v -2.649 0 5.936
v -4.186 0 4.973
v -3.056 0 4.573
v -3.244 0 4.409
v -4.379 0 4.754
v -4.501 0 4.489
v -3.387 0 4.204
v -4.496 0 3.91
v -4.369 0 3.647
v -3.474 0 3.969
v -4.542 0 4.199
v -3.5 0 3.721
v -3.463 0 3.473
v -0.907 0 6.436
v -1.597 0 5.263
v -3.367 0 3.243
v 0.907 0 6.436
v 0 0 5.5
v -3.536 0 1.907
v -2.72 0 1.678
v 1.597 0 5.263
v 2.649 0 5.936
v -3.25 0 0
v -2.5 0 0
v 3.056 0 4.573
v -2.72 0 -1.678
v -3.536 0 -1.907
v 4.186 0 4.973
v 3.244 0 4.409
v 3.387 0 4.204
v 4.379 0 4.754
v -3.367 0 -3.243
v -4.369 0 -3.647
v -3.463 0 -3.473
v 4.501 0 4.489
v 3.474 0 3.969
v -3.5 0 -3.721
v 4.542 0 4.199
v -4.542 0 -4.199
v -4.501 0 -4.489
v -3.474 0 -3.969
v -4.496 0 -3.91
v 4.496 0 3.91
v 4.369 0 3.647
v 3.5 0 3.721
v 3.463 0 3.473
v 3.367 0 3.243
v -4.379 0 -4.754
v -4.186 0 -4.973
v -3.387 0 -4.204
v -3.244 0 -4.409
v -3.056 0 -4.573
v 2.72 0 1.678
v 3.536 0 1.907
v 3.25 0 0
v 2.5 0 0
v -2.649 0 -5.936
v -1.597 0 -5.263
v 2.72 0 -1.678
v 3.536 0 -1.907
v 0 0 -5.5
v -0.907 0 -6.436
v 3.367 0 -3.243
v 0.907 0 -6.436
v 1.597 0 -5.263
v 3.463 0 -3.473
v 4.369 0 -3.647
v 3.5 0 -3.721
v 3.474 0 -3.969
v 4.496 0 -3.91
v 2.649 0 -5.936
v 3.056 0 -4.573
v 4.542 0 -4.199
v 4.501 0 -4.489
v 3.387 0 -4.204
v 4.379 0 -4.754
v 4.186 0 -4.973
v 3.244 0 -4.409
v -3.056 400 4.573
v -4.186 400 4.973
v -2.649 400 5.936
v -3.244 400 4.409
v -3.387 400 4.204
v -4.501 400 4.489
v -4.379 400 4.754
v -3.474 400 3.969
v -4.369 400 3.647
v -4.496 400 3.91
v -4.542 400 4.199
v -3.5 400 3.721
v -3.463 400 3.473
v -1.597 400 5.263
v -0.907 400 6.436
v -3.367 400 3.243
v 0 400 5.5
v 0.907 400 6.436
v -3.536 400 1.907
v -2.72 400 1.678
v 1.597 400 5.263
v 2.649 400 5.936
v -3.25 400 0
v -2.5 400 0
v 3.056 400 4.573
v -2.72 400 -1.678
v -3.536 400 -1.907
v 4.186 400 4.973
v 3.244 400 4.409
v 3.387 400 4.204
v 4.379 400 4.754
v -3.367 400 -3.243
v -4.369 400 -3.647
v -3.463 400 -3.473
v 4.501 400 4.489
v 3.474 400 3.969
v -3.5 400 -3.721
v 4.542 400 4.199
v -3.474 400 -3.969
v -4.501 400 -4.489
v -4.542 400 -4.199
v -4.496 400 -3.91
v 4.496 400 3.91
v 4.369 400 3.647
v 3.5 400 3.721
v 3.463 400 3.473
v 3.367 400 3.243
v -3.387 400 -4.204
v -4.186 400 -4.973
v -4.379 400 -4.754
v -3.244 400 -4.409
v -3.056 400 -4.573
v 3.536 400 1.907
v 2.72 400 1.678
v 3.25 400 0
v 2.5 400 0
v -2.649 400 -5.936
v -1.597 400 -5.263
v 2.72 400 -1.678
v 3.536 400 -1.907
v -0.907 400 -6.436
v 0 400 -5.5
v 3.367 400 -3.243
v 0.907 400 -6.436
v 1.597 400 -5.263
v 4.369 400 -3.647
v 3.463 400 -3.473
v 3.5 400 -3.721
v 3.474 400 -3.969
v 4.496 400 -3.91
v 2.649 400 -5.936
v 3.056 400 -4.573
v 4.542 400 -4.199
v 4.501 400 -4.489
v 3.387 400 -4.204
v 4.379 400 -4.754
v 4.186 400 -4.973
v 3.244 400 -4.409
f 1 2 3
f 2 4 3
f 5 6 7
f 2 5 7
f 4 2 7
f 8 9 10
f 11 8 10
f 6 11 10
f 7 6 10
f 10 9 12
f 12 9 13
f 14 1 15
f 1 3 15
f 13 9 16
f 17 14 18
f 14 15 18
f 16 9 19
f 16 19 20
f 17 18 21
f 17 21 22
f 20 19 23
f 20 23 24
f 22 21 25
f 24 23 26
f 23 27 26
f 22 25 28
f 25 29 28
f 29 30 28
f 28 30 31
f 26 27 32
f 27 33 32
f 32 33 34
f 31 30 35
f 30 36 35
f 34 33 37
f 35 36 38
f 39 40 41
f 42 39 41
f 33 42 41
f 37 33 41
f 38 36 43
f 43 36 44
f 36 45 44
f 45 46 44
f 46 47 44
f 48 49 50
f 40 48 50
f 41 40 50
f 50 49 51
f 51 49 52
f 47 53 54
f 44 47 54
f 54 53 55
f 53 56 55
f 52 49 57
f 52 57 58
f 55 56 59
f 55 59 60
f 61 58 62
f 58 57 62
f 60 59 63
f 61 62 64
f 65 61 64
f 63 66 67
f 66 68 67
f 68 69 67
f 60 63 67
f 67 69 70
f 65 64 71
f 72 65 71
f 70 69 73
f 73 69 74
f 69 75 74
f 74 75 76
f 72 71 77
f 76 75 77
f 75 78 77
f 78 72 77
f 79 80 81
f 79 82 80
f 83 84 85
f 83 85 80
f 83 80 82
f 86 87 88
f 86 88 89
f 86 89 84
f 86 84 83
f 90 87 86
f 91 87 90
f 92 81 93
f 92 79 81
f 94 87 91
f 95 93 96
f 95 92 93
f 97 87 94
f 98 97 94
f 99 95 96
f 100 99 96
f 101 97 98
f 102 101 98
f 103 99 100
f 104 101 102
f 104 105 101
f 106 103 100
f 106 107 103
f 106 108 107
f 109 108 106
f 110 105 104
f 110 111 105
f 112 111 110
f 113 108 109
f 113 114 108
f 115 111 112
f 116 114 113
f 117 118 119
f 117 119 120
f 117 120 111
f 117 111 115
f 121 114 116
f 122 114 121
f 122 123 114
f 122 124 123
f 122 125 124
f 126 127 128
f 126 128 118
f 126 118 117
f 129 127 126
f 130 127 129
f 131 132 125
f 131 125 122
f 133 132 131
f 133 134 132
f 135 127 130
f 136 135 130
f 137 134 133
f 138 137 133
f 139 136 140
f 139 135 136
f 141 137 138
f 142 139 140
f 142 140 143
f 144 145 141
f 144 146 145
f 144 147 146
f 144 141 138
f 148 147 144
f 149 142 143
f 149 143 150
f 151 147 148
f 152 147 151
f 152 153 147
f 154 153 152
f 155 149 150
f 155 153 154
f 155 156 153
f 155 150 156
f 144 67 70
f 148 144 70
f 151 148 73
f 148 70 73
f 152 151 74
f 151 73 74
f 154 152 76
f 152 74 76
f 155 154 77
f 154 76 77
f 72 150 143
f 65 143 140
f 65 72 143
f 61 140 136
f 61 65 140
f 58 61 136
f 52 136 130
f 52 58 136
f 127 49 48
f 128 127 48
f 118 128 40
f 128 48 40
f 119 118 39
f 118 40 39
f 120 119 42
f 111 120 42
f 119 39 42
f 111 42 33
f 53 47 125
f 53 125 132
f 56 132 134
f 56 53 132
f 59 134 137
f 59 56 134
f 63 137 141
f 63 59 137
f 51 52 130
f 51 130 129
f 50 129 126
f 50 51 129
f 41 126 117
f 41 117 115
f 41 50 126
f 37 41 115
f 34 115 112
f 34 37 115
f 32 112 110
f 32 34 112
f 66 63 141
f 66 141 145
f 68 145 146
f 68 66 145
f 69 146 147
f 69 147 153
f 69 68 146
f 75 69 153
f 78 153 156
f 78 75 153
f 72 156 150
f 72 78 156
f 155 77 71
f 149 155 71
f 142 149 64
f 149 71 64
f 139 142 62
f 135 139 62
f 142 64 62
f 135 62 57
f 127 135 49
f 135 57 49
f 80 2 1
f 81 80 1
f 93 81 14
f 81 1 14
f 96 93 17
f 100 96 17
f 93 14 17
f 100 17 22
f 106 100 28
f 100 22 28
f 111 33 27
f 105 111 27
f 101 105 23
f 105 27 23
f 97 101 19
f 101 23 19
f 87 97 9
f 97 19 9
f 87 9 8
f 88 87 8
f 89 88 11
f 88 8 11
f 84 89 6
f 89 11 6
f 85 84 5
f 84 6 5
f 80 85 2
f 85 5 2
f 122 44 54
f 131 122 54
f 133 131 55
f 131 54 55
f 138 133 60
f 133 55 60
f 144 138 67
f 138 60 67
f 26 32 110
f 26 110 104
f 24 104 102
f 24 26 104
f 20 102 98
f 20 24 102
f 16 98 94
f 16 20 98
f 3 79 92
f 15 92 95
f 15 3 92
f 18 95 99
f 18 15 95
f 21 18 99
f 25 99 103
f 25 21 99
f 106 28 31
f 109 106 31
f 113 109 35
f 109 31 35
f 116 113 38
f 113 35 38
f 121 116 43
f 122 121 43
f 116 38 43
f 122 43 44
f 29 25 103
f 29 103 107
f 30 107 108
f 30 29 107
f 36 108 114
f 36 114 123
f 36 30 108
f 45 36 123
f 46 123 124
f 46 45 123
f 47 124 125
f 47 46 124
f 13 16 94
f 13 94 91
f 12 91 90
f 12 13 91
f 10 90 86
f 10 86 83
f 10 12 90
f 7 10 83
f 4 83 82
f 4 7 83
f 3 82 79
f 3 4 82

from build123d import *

# Parameters (mm, degrees)
BOSS_EXTRUDE1_DEPTH = 400


with BuildPart() as part:
    # Sketch1 → Boss-Extrude1 (new body)
    with BuildSketch(Plane(origin=(0, 0, 0), x_dir=(1, 0, 0), z_dir=(0, 1, 0))):
        with BuildLine():
            ThreePointArc((-4.185606061, -4.972997276), (0, -6.5), (4.185606061, -4.972997276))
            ThreePointArc((4.185606061, -4.972997276), (4.532194193, -4.345235079), (4.369444444, -3.646864669))
            ThreePointArc((4.369444444, -3.646864669), (3.25, 0), (4.369444444, 3.646864669))
            ThreePointArc((4.369444444, 3.646864669), (4.532194193, 4.345235079), (4.185606061, 4.972997276))
            ThreePointArc((4.185606061, 4.972997276), (0, 6.5), (-4.185606061, 4.972997276))
            ThreePointArc((-4.185606061, 4.972997276), (-4.532194193, 4.345235079), (-4.369444444, 3.646864669))
            ThreePointArc((-4.369444444, 3.646864669), (-3.25, 0), (-4.369444444, -3.646864669))
            ThreePointArc((-4.369444444, -3.646864669), (-4.532194193, -4.345235079), (-4.185606061, -4.972997276))
        make_face()
        with BuildLine():
            ThreePointArc((-3.055555556, -4.573136806), (0, -5.5), (3.055555556, -4.573136806))
            ThreePointArc((3.055555556, -4.573136806), (3.473728991, -3.969367404), (3.366666667, -3.242769735))
            ThreePointArc((3.366666667, -3.242769735), (2.5, 0), (3.366666667, 3.242769735))
            ThreePointArc((3.366666667, 3.242769735), (3.473728991, 3.969367404), (3.055555556, 4.573136806))
            ThreePointArc((3.055555556, 4.573136806), (0, 5.5), (-3.055555556, 4.573136806))
            ThreePointArc((-3.055555556, 4.573136806), (-3.473728991, 3.969367404), (-3.366666667, 3.242769735))
            ThreePointArc((-3.366666667, 3.242769735), (-2.5, 0), (-3.366666667, -3.242769735))
            ThreePointArc((-3.366666667, -3.242769735), (-3.473728991, -3.969367404), (-3.055555556, -4.573136806))
        make_face(mode=Mode.SUBTRACT)
    extrude(amount=BOSS_EXTRUDE1_DEPTH)


solid = part.part
